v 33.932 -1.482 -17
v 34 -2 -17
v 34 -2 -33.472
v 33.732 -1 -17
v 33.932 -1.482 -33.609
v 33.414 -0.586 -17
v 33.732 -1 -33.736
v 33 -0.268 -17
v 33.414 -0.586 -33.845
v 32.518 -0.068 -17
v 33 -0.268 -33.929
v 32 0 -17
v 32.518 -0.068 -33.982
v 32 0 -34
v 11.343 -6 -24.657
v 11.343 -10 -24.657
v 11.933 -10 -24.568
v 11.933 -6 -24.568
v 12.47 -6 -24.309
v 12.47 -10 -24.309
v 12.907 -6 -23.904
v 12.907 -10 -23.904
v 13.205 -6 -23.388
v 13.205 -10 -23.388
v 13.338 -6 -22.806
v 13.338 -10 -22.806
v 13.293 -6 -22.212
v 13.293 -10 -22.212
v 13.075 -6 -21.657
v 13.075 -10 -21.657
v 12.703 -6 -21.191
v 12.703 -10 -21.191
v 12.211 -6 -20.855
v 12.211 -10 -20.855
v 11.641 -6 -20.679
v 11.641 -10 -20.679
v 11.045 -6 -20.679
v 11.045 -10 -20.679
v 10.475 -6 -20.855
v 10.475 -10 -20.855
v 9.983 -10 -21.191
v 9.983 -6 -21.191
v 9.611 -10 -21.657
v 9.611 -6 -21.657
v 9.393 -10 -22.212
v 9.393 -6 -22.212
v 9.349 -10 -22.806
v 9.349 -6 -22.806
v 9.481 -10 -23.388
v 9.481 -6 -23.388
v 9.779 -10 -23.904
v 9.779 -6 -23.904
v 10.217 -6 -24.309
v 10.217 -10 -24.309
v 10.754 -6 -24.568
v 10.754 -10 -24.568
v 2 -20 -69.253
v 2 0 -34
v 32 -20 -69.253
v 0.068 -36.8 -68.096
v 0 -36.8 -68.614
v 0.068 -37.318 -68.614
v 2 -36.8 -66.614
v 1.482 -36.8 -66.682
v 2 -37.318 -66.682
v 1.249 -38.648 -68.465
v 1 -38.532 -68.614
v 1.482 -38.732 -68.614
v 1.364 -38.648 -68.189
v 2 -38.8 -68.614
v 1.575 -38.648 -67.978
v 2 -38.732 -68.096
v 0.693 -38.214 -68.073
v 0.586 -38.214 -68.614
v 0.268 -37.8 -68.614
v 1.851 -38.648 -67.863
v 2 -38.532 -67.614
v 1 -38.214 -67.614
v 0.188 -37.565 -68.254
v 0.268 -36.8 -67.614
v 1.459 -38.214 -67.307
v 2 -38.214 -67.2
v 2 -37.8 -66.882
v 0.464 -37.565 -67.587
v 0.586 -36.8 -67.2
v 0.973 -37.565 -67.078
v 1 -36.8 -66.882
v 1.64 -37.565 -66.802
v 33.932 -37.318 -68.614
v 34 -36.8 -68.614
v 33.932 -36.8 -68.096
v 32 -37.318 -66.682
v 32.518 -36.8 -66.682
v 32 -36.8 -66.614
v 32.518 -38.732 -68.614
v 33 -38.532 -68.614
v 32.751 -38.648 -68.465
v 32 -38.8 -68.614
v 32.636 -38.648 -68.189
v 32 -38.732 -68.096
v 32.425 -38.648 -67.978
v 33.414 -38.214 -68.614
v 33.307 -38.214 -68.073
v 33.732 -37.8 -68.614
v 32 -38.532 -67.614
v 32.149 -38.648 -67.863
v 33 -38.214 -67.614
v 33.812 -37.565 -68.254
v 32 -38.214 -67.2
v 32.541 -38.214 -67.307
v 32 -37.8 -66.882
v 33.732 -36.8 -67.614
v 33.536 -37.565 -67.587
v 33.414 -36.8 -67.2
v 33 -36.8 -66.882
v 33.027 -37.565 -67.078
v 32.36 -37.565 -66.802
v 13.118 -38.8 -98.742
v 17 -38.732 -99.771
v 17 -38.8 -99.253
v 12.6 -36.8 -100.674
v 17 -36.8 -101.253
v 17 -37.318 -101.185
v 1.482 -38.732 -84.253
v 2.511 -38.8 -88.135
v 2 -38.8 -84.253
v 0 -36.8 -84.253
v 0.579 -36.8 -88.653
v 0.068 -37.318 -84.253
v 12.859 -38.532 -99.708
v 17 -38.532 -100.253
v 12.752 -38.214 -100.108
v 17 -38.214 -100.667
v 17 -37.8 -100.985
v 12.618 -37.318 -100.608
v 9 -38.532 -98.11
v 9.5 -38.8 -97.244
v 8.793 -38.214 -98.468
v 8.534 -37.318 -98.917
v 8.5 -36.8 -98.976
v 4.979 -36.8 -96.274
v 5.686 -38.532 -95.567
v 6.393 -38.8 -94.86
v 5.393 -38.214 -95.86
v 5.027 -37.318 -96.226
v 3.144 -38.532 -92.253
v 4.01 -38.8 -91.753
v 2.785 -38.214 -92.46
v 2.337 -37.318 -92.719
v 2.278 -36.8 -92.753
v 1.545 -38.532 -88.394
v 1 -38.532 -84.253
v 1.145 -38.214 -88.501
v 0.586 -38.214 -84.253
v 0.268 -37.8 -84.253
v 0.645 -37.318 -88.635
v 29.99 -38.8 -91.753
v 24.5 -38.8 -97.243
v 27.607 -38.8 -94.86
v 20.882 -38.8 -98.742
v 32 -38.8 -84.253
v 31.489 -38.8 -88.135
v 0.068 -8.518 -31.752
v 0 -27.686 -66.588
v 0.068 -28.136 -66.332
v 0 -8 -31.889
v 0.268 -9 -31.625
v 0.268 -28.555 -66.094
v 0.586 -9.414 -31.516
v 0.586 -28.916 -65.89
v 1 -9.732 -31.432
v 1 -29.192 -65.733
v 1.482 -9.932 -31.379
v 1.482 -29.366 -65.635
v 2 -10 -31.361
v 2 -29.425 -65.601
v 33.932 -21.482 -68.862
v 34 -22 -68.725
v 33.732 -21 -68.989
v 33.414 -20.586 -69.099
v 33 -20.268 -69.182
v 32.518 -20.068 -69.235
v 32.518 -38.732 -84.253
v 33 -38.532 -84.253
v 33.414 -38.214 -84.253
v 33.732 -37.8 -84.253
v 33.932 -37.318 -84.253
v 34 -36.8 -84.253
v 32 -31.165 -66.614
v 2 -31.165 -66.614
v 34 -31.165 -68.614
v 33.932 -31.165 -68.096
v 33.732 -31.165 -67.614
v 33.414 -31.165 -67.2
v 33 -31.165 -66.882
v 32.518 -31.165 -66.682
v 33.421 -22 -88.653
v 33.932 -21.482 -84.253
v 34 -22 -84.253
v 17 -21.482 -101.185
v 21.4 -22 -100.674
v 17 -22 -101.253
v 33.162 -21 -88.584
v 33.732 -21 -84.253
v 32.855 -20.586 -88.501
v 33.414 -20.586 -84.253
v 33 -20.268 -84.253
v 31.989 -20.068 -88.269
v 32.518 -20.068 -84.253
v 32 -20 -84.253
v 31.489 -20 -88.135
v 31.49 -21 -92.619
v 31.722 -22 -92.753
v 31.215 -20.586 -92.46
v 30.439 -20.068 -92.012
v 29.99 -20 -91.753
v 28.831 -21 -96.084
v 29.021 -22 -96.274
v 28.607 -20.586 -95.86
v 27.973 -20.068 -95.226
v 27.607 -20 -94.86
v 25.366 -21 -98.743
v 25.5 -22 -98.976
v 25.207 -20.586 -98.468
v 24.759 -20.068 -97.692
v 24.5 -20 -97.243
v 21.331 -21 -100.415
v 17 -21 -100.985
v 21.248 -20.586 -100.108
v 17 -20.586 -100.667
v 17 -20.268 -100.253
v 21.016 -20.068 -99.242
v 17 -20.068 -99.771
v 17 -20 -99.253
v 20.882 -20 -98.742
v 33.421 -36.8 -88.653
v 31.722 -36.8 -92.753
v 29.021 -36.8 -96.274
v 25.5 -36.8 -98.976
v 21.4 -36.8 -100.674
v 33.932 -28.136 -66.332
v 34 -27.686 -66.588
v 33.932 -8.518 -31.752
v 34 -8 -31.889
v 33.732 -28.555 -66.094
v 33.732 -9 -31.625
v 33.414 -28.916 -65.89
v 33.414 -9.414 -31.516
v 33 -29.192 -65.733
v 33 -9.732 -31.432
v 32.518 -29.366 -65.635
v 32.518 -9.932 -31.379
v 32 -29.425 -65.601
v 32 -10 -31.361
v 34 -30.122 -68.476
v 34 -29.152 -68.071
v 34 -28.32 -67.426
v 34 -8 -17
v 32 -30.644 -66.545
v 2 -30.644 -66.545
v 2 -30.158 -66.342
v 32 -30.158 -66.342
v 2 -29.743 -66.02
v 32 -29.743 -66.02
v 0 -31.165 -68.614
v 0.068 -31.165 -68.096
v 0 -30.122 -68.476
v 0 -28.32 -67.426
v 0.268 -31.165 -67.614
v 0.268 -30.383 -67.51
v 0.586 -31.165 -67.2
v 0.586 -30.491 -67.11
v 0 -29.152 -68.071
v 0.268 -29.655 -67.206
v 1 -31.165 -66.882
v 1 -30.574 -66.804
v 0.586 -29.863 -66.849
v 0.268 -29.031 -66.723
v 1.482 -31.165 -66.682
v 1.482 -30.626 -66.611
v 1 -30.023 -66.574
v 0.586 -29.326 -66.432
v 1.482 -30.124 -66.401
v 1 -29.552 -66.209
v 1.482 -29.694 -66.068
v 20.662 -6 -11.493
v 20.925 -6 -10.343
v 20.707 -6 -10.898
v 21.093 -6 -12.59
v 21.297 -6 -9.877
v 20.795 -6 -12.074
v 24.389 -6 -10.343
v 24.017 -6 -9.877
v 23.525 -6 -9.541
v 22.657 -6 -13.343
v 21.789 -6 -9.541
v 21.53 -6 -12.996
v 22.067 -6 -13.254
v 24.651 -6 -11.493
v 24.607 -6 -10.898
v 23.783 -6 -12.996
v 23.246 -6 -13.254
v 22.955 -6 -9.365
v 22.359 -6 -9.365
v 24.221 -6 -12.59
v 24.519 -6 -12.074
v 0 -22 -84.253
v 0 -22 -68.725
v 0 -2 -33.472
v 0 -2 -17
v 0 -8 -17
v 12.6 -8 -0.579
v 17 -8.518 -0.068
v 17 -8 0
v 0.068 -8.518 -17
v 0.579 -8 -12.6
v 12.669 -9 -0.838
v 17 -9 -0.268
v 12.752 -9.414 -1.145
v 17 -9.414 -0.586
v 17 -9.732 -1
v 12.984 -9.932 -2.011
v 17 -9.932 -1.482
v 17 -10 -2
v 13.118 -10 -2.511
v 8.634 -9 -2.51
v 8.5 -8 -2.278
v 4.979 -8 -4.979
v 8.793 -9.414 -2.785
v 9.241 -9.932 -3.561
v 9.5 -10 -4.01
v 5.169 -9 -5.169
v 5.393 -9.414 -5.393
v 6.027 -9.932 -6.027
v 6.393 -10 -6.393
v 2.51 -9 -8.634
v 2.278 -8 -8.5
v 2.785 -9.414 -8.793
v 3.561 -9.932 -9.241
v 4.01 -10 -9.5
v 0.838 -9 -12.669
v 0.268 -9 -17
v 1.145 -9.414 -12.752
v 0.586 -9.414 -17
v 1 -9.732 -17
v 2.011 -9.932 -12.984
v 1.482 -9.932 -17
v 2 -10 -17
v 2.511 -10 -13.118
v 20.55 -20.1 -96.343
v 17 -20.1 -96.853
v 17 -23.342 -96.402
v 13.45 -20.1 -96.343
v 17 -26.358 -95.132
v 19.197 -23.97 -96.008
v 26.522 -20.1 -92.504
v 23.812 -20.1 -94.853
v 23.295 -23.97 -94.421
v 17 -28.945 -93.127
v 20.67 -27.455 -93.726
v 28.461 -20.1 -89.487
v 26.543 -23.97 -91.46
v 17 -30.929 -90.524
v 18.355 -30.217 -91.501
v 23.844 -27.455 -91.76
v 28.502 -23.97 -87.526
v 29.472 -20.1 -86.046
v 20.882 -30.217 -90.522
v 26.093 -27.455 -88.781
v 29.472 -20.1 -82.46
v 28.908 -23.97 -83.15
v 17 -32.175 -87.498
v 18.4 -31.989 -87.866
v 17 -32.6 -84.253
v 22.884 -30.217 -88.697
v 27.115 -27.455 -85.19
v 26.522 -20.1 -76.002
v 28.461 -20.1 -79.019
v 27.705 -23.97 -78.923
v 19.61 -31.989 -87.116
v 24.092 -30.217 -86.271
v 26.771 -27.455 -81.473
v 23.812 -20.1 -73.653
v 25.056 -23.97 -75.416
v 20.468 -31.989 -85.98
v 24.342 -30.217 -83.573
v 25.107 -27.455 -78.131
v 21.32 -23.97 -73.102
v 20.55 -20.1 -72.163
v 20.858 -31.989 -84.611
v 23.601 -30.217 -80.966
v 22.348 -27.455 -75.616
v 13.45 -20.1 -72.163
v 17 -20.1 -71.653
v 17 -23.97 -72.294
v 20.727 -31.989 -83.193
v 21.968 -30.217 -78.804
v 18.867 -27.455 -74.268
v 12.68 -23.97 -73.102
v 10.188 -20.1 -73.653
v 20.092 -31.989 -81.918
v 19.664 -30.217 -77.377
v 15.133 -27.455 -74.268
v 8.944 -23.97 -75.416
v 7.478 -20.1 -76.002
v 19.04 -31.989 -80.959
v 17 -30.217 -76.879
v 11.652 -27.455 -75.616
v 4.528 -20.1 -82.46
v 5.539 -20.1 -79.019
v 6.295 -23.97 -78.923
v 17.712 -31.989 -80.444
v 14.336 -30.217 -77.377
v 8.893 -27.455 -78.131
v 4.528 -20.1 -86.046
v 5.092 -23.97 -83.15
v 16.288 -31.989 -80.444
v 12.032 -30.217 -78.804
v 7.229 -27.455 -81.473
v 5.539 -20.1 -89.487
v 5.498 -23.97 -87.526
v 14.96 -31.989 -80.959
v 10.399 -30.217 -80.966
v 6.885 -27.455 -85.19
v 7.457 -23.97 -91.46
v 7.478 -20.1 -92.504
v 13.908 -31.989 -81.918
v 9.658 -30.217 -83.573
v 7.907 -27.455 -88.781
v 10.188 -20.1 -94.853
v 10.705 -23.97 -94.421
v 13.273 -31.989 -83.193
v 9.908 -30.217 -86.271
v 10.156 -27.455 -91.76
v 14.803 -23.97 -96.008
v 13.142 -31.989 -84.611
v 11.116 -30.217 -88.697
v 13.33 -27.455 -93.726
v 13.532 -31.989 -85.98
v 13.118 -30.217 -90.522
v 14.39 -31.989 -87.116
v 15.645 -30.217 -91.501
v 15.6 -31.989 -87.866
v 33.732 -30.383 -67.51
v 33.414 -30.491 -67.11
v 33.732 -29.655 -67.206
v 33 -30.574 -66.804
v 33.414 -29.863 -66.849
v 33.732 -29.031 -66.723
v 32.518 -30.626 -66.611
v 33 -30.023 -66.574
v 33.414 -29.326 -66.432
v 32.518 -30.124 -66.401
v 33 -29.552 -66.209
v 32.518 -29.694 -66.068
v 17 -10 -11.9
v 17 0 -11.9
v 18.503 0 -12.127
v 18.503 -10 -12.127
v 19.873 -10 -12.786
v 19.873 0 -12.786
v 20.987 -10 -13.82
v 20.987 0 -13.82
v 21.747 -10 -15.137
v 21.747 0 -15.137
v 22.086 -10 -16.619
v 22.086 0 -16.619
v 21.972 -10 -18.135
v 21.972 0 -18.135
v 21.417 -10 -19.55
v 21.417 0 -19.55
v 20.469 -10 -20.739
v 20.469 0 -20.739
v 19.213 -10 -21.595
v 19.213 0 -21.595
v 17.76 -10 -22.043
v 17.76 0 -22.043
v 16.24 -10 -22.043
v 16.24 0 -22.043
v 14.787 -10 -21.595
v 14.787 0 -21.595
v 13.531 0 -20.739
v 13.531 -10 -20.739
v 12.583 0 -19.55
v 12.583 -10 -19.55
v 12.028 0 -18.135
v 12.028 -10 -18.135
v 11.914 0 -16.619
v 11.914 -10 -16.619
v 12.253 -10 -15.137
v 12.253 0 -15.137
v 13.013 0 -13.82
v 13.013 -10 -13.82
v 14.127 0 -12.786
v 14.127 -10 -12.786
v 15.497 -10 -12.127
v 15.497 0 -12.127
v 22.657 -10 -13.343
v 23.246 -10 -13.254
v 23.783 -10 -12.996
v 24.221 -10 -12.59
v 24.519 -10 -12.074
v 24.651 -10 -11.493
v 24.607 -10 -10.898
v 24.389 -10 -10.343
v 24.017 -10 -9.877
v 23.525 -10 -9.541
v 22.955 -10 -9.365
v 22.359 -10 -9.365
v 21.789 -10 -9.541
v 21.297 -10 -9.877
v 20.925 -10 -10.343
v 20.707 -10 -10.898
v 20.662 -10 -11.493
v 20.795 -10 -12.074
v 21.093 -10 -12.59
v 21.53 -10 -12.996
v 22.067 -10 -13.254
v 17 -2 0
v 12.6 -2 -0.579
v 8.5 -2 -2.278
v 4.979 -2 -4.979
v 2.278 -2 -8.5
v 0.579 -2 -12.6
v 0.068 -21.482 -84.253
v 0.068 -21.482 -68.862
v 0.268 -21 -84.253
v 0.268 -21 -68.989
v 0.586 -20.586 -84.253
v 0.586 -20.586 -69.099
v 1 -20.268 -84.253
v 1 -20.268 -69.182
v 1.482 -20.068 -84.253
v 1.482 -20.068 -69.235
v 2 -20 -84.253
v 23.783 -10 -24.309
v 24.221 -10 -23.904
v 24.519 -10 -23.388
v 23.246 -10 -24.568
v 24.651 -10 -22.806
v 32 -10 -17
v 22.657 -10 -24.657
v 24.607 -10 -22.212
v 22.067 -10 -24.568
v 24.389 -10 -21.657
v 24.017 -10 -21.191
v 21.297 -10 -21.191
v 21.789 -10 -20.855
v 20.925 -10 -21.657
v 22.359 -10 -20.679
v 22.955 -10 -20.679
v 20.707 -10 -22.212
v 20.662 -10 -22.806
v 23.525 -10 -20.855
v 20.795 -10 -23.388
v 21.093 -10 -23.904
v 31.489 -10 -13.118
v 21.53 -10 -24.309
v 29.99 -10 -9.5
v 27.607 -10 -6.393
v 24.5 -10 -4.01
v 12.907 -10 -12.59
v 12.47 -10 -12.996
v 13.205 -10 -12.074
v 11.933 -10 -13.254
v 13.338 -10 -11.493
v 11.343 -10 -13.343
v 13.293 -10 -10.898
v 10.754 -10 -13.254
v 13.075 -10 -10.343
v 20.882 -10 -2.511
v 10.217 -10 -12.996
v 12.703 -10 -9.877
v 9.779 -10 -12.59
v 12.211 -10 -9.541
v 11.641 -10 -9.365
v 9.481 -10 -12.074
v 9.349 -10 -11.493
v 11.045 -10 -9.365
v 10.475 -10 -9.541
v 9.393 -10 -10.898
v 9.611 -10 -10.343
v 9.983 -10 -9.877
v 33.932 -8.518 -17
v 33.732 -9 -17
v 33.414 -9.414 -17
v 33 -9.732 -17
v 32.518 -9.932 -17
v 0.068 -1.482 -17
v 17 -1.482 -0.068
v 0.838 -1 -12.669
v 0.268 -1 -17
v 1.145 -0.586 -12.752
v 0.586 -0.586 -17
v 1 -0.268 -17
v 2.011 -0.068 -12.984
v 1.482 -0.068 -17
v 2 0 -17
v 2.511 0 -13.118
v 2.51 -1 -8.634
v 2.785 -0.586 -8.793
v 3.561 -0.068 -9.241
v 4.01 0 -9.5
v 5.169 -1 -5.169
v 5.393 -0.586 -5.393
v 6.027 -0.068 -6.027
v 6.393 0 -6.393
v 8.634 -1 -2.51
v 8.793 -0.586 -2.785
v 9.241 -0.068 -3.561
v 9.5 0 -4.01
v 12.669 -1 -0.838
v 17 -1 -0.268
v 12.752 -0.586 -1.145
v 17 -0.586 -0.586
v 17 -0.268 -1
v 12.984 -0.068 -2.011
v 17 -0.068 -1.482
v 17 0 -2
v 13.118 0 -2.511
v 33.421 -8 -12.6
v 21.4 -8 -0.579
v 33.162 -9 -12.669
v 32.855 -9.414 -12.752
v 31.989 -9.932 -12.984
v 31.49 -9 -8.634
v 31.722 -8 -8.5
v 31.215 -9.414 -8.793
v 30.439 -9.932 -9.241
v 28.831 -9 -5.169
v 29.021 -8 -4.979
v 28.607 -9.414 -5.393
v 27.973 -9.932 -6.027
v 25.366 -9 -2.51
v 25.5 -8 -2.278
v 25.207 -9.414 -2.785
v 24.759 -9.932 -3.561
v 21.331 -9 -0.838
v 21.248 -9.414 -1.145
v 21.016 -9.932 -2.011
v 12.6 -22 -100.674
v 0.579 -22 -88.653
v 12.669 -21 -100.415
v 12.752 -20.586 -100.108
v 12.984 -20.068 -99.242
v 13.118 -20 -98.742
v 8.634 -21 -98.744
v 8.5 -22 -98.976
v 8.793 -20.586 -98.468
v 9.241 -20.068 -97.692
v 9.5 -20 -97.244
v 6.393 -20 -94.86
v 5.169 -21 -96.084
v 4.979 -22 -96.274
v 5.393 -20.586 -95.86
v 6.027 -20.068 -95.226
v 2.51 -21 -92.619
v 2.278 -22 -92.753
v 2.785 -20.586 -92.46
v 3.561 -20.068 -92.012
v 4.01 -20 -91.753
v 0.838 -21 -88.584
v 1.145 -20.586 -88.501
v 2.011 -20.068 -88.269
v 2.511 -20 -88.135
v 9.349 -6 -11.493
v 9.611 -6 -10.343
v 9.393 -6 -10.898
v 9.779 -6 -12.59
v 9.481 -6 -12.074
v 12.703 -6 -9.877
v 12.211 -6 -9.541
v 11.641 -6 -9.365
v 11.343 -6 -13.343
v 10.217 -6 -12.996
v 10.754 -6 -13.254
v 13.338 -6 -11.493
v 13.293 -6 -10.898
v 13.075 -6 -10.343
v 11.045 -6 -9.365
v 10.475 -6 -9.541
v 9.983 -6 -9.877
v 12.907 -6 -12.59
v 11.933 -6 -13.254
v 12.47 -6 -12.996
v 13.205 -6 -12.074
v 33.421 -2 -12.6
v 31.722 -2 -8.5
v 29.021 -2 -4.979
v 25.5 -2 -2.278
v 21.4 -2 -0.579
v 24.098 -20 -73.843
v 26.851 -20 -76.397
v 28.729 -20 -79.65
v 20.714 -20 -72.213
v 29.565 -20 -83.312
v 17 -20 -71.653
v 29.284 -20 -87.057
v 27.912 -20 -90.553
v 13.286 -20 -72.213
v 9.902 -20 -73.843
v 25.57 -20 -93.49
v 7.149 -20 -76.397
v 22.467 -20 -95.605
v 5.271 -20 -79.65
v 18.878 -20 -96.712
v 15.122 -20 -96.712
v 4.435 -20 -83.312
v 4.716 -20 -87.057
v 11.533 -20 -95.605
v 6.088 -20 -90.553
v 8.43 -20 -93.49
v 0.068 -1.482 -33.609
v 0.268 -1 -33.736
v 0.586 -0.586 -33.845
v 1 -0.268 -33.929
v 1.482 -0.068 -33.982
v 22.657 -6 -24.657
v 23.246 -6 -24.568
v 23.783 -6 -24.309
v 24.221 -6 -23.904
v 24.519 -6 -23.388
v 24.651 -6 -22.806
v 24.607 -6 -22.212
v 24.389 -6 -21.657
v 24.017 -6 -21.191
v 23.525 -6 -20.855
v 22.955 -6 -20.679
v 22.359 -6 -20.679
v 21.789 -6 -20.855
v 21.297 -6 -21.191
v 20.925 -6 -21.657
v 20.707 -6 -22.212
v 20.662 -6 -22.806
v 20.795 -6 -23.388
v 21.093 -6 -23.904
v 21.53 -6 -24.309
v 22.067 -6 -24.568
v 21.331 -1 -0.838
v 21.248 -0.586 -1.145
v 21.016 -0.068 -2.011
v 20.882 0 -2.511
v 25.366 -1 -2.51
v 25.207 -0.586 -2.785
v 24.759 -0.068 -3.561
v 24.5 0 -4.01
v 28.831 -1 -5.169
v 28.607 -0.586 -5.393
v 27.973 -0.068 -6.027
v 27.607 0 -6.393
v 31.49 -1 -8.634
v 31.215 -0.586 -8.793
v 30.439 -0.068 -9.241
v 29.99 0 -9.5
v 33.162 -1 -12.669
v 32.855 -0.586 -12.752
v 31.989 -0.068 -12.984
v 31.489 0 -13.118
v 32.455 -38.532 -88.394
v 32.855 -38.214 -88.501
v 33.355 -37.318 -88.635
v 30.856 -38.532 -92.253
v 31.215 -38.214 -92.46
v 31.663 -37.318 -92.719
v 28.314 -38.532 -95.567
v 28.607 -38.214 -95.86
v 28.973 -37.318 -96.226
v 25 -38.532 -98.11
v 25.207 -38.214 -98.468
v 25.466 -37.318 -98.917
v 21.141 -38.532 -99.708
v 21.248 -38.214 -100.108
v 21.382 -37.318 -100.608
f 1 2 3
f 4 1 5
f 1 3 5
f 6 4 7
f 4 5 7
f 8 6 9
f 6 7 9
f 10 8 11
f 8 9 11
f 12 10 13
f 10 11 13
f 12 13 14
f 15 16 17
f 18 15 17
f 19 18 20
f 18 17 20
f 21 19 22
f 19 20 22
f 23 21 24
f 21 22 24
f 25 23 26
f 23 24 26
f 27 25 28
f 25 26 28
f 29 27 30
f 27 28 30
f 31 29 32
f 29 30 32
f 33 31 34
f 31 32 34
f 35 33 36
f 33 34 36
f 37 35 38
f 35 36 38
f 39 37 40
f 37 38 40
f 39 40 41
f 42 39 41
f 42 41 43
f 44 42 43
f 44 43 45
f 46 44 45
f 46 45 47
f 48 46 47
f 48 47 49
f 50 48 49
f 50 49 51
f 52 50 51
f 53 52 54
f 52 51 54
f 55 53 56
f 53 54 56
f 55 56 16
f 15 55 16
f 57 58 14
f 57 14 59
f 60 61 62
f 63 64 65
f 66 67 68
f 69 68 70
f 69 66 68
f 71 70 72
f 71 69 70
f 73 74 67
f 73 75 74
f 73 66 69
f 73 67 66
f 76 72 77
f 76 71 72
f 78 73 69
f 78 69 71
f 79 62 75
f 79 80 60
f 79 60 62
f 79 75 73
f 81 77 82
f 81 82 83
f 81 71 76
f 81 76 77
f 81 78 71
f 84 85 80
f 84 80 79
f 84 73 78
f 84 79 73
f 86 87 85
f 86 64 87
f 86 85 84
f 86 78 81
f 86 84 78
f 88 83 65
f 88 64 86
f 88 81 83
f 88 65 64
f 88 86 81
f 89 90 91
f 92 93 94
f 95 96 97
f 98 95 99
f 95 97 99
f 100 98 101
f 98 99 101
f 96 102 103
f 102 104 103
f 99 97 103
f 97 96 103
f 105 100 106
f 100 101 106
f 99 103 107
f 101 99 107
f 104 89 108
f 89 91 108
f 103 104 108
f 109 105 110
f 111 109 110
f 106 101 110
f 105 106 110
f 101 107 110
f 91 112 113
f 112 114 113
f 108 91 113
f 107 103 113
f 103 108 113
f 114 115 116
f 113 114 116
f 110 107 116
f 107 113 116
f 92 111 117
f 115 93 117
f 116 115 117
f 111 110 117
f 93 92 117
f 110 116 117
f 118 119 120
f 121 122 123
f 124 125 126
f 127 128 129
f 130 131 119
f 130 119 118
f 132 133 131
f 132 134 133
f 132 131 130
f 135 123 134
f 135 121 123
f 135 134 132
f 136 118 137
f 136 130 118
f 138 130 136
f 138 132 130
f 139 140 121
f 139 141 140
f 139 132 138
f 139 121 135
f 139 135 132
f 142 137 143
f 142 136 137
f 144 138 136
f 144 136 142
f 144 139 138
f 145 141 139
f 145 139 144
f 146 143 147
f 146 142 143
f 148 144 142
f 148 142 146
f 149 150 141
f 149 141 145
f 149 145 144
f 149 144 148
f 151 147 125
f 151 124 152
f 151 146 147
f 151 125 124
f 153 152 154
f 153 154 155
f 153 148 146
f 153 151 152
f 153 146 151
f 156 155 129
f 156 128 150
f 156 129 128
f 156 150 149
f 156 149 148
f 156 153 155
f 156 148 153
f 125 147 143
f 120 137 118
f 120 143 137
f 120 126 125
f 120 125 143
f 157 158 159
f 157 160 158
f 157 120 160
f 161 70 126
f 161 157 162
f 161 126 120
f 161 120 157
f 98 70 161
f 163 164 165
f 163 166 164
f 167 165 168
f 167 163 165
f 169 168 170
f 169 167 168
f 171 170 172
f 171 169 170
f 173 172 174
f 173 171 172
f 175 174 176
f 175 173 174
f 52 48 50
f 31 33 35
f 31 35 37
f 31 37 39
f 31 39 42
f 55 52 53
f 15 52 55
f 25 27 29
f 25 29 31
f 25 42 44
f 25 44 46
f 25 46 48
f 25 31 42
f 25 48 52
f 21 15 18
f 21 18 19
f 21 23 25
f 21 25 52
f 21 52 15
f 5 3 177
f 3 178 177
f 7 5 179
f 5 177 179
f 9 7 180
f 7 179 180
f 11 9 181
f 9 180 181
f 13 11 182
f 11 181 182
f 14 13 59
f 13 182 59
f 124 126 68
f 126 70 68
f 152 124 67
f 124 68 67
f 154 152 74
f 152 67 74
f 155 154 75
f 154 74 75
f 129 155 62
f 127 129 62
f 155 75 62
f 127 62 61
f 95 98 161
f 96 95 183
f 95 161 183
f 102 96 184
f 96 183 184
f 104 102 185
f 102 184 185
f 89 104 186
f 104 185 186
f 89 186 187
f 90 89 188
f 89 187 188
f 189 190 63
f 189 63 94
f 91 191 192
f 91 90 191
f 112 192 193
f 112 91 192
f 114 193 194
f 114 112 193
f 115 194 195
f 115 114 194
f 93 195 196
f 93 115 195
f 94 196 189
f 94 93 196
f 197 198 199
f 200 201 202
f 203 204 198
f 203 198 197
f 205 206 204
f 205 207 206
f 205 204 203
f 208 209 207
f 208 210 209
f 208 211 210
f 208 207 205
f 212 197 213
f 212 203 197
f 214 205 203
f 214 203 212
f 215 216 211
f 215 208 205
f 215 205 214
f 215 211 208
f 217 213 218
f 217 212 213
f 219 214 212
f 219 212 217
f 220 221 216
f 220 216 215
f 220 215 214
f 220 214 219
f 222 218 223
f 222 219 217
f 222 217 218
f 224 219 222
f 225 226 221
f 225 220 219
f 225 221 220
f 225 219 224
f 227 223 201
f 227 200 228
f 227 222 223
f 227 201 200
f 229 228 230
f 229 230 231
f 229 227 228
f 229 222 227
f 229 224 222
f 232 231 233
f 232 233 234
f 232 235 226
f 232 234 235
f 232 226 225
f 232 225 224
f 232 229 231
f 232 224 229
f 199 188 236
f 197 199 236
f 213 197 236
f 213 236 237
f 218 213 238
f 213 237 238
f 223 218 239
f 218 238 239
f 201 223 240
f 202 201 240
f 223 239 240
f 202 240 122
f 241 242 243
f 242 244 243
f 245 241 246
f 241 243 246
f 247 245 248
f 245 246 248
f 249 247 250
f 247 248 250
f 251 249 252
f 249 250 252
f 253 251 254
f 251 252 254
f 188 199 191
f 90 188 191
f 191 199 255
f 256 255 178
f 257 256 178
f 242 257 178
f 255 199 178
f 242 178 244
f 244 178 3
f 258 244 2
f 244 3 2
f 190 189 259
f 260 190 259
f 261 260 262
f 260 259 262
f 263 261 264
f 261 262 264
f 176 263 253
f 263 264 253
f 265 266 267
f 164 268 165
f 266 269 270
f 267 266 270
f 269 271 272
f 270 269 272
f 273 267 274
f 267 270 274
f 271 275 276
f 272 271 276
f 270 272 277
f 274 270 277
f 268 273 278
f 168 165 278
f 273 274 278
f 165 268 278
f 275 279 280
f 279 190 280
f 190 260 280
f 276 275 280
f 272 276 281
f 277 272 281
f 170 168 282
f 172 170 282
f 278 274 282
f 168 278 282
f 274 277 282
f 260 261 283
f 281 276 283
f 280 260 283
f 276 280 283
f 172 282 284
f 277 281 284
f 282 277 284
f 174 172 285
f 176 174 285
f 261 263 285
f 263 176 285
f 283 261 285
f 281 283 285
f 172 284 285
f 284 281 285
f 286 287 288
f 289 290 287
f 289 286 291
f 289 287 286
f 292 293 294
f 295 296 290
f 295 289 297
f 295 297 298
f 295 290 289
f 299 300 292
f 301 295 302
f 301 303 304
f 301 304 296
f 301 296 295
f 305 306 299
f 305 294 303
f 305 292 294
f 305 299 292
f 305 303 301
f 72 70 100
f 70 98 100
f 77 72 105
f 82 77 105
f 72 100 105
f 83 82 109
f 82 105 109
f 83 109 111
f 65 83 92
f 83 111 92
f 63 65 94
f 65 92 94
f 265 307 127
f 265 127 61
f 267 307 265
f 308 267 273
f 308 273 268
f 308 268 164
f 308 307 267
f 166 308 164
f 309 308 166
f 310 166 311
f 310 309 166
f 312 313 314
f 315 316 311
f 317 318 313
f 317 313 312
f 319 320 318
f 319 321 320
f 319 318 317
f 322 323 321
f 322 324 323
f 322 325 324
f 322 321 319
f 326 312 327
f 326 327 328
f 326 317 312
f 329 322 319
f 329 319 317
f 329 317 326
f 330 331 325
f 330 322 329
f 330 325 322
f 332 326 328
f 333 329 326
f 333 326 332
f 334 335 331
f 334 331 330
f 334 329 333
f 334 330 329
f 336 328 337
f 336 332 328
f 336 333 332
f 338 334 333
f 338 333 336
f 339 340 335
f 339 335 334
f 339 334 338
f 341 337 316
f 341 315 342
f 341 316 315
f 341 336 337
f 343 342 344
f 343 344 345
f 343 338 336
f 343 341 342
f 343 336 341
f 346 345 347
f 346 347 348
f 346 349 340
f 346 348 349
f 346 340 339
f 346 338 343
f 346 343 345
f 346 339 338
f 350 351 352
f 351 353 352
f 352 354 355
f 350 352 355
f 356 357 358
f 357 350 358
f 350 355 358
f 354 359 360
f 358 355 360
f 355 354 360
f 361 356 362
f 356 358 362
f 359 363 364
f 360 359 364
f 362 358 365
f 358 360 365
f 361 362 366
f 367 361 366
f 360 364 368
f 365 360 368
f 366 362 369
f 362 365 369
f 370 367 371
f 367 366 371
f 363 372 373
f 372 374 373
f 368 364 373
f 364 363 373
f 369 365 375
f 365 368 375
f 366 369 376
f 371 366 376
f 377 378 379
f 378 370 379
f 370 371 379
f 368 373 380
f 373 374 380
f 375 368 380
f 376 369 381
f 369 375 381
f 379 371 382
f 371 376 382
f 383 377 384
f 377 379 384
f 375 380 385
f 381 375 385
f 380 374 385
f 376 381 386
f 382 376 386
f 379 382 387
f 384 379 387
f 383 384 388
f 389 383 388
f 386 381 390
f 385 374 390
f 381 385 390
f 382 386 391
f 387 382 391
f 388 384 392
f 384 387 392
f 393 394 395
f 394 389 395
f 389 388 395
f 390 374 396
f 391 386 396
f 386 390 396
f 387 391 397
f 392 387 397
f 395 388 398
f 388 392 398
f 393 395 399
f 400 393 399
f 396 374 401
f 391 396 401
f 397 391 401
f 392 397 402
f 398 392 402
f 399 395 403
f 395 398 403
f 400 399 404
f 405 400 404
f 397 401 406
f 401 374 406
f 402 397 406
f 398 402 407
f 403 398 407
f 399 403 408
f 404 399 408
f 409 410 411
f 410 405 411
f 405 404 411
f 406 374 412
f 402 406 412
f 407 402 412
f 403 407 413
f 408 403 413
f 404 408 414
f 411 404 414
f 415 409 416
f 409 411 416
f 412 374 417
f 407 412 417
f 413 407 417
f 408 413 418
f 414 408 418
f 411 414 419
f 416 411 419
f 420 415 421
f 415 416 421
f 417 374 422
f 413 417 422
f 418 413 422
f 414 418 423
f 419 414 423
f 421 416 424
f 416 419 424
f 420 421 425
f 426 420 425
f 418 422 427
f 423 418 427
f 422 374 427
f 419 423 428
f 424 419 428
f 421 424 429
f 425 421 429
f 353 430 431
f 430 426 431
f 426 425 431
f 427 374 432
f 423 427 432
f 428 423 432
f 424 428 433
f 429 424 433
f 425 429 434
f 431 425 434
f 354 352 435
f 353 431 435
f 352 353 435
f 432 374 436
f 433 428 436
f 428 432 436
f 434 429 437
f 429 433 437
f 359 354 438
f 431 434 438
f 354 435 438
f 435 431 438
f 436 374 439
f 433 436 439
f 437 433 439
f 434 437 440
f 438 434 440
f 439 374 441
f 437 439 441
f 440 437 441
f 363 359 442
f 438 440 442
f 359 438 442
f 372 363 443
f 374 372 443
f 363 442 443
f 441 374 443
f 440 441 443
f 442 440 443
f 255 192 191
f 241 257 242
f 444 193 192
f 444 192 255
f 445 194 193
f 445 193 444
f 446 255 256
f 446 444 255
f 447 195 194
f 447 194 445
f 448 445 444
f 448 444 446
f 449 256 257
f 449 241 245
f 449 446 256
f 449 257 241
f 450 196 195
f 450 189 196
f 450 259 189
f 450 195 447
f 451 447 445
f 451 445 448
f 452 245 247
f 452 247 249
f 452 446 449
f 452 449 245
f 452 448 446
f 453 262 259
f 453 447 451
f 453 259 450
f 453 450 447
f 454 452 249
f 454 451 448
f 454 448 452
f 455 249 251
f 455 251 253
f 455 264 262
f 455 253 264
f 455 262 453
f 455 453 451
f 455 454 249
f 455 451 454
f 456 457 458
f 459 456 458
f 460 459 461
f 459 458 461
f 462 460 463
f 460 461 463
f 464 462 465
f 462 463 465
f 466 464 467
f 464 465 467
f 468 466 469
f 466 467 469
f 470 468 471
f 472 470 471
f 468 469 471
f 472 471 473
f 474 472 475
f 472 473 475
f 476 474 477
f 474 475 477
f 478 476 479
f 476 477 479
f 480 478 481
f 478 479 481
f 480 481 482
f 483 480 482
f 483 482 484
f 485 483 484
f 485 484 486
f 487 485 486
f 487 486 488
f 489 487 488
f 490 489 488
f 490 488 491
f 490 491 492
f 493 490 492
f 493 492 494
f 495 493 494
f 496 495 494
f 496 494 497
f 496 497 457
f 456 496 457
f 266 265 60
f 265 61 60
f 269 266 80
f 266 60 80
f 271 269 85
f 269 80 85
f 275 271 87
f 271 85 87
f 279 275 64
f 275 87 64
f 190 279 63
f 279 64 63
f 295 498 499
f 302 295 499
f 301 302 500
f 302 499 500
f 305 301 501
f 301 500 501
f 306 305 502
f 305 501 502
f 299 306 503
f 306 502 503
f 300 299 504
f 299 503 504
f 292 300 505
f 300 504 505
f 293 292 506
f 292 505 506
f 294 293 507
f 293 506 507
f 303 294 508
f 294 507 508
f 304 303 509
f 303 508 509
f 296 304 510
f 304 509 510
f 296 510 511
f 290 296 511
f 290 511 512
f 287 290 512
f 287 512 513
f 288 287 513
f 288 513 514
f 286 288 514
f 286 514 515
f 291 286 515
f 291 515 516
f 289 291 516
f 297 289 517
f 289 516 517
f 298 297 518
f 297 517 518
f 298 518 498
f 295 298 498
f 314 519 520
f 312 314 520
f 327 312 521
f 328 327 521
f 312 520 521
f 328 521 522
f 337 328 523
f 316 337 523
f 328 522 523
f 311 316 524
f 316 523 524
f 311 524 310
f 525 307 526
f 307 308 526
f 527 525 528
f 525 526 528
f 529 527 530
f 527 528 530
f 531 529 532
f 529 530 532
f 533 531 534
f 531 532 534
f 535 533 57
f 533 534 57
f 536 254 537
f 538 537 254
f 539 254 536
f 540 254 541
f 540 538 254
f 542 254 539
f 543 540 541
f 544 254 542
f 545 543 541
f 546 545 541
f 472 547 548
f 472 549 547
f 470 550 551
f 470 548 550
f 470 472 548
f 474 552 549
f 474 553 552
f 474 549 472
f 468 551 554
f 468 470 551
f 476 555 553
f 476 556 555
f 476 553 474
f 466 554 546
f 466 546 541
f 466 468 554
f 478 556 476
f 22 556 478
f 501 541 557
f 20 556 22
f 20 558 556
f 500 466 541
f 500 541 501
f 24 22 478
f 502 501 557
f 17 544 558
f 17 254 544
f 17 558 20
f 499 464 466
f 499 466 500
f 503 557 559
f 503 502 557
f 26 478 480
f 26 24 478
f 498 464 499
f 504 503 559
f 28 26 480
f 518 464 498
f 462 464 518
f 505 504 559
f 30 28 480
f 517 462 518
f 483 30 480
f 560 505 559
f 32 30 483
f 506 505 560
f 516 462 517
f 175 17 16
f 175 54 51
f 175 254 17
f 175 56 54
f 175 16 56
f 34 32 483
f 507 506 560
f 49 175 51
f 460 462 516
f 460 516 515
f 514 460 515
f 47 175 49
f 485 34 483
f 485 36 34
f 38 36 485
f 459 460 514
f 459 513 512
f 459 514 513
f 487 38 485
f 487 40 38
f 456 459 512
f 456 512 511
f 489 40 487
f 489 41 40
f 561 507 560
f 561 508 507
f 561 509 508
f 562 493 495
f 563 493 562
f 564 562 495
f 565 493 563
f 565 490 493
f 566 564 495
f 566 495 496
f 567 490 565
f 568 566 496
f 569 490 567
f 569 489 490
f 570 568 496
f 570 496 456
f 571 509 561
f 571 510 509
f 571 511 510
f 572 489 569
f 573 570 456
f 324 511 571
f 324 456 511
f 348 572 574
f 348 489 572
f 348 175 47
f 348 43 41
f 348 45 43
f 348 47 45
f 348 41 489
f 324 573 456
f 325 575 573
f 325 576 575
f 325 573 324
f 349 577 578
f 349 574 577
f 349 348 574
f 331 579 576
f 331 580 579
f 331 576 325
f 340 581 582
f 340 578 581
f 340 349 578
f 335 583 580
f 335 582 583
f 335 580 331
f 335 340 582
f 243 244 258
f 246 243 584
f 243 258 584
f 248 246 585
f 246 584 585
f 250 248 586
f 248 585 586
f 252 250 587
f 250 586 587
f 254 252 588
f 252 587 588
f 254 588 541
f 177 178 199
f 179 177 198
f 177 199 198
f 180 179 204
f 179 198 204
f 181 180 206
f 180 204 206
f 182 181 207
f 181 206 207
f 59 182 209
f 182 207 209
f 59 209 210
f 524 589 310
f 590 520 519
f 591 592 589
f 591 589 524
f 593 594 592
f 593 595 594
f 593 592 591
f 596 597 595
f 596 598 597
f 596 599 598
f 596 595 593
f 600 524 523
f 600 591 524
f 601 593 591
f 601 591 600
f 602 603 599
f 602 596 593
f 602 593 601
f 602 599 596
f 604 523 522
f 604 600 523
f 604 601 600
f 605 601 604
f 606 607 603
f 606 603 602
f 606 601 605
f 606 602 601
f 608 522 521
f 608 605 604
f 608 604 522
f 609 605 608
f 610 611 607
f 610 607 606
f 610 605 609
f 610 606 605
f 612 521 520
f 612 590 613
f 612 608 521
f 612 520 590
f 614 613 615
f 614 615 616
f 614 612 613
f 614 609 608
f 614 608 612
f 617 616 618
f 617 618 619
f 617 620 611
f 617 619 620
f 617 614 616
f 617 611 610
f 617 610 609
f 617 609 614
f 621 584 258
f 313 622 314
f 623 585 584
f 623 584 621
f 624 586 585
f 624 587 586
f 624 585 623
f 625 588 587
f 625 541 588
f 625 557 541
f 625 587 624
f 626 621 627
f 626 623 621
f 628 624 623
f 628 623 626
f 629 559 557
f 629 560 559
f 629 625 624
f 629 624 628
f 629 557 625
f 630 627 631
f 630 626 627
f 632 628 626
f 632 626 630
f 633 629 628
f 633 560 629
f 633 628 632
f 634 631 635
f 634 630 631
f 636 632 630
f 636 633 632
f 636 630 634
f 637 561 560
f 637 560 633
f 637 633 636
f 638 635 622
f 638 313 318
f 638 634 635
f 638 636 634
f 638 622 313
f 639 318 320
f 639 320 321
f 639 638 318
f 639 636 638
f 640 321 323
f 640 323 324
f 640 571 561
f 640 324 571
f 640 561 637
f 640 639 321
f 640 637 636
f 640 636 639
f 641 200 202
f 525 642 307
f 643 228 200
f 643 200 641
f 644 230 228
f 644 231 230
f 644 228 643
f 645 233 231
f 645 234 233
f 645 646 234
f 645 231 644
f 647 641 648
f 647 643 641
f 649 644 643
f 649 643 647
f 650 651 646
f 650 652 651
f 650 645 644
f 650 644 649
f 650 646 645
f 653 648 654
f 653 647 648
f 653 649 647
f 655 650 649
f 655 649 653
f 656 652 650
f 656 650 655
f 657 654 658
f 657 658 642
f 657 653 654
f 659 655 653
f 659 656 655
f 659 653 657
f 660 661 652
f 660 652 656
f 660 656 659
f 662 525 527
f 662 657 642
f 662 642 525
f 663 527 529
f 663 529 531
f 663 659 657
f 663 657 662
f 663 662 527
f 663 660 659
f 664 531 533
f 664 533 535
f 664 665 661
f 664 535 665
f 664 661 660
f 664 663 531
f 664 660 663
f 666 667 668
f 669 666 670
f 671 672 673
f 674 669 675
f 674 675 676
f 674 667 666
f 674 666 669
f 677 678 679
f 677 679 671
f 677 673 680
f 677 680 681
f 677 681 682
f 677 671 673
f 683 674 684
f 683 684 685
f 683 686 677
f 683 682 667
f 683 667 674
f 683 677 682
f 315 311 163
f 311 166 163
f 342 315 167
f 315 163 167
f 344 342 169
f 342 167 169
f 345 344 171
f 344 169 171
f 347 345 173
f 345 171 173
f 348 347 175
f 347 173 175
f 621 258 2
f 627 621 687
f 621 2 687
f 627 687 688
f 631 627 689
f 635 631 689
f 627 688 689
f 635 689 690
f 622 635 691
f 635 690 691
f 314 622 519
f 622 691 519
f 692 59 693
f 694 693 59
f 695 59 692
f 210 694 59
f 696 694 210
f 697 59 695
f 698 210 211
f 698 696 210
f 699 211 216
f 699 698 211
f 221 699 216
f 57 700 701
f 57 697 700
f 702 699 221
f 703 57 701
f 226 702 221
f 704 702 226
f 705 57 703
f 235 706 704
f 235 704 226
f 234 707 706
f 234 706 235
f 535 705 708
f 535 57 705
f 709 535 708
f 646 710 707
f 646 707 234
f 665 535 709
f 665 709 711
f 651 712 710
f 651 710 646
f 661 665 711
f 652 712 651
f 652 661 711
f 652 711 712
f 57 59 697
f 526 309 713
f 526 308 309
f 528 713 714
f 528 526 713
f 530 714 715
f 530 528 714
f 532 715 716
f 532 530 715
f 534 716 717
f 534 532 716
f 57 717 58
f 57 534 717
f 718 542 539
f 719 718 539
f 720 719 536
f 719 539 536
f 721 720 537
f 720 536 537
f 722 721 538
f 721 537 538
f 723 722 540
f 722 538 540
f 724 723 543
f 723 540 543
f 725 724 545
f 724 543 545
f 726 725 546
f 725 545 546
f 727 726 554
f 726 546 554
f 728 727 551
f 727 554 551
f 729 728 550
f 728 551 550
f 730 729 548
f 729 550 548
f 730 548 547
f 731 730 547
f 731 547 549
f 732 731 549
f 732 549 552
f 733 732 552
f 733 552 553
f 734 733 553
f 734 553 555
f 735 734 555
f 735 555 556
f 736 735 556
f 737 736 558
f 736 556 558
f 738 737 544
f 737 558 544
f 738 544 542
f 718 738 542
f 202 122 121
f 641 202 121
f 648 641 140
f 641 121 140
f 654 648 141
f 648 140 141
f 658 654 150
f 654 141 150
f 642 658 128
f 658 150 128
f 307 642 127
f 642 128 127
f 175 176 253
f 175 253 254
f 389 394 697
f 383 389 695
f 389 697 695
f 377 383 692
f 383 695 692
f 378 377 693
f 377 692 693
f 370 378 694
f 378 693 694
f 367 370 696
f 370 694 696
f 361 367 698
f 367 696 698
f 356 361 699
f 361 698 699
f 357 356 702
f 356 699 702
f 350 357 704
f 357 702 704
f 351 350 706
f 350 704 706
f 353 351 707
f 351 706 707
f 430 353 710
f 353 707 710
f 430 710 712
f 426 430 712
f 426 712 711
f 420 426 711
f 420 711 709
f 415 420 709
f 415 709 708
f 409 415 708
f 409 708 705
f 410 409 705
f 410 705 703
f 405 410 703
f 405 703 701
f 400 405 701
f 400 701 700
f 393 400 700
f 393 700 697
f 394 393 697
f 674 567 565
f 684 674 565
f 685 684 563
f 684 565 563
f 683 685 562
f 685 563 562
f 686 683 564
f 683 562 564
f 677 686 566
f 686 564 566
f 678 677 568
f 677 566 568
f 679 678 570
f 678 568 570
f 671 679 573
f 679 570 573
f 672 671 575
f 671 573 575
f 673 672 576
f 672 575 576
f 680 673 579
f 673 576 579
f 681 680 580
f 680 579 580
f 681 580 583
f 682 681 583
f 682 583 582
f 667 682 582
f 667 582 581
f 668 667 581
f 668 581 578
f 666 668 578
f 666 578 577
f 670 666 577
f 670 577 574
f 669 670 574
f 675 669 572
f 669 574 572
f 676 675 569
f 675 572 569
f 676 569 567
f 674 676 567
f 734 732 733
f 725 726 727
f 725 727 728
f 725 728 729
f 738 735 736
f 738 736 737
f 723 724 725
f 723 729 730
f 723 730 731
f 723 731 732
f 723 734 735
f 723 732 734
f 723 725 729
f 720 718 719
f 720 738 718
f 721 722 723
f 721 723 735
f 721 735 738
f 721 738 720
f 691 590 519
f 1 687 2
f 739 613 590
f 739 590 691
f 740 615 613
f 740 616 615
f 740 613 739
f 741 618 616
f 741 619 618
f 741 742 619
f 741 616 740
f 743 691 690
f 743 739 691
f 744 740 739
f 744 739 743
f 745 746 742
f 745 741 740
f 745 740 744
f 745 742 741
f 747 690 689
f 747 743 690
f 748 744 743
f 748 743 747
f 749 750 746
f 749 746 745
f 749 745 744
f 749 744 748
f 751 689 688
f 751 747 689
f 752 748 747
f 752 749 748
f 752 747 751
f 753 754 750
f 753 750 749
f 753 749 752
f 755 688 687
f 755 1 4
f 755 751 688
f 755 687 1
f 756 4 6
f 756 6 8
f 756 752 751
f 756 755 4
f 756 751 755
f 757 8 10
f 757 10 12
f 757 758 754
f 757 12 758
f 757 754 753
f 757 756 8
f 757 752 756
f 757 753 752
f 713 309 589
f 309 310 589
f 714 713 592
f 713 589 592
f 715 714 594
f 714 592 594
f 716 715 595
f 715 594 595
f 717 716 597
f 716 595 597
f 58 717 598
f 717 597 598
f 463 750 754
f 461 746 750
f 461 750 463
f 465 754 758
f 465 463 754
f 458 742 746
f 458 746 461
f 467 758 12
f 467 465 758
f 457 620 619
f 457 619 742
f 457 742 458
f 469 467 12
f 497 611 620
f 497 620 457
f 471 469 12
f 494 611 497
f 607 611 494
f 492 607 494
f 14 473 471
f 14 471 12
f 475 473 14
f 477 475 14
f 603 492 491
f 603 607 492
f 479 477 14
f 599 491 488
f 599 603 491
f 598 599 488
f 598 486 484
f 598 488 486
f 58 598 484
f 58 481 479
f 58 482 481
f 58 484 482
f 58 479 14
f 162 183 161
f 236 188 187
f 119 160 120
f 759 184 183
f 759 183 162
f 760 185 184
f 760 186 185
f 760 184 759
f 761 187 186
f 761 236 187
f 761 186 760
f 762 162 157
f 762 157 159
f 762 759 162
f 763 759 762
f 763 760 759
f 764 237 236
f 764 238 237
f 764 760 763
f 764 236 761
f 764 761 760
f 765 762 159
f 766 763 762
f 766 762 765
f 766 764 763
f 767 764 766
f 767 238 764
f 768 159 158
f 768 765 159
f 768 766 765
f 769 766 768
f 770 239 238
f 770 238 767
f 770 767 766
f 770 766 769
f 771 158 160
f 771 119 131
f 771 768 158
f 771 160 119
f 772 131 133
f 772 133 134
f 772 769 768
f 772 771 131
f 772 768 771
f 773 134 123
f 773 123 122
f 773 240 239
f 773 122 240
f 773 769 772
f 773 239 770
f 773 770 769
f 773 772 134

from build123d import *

# Parameters (mm, degrees)
PROFILEEXTRUDE_THIN1_DEPTH          = 34
DOMEPADEXTENSIONSKETCH1_W           = 34
DOMEPADEXTENSIONSKETCH1_H           = 34.639067238
DOMEPADEXTENSIONBOSS_EXTRUDE1_DEPTH = 8.8
FILLET1_R                           = 17
FILLET2_R                           = 17
FLANGENUTHOLESKETCH4_R              = 5.1
FLANGENUTHOLECUT_EXTRUDE5_DEPTH     = 114.638162666
DOMEINDENTSKETCH6_R                 = 12.6
DOMEINDENTCUT_EXTRUDE8_DEPTH        = 0.1
DOME2_FACE_RADIUS                   = 12.6
DOME2_HEIGHT                        = 12.5
FILLET3_R                           = 17
FILLET4_R                           = 17
BOTTOMBOUNDARYFILLET5_R             = 2
FLANGENUTHOLESSKETCH2_R             = 2
FLANGENUTHOLESCUT_EXTRUDE1_DEPTH    = 4
FILLET6_R                           = 2


with BuildPart() as part:
    # ProfileSketch1 → ProfileExtrude-Thin1 (new body)
    with BuildSketch(Plane(origin=(0, 0, 0), x_dir=(0, 0, -1), z_dir=(1, 0, 0))):
        Polygon((0, 0), (34, 0), (69.253108664, -20), (101.253108664, -20), (101.253108664, -30), (66.614041426, -30), (31.360932762, -10), (0, -10), align=None)
    extrude(amount=PROFILEEXTRUDE_THIN1_DEPTH)

    # DomePadExtensionSketch1 → DomePadExtensionBoss-Extrude1 (add)
    with BuildSketch(Plane.XZ.offset(30)):
        with Locations((17, -83.933575045)):
            Rectangle(DOMEPADEXTENSIONSKETCH1_W, DOMEPADEXTENSIONSKETCH1_H)
    extrude(amount=DOMEPADEXTENSIONBOSS_EXTRUDE1_DEPTH)

    # Fillet1
    fillet1_edges = [part.edges().sort_by_distance(p)[0] for p in [
        (34, -5, 0),
    ]]
    fillet(fillet1_edges, radius=FILLET1_R)

    # Fillet2
    fillet2_edges = [part.edges().sort_by_distance(p)[0] for p in [
        (0, -5, 0),
    ]]
    fillet(fillet2_edges, radius=FILLET2_R - 0.0001)  # a hair under: the kernel refuses the full size

    # FlangeNutHoleSketch4 → FlangeNutHoleCut-Extrude5 (cut, through all)
    with BuildSketch(Plane(origin=(0, 0, 0), x_dir=(1, 0, 0), z_dir=(0, 1, 0))):
        with Locations(Location((17, 17, 0), (0, 0, 270))):
            Circle(FLANGENUTHOLESKETCH4_R)
    extrude(amount=-FLANGENUTHOLECUT_EXTRUDE5_DEPTH, mode=Mode.SUBTRACT)

    # DomeIndentSketch6 → DomeIndentCut-Extrude8 (cut)
    with BuildSketch(Plane(origin=(0, -20, 0), x_dir=(1, 0, 0), z_dir=(0, 1, 0))):
        with Locations(Location((17, 84.253108664, 0), (0, 0, 270))):
            Circle(DOMEINDENTSKETCH6_R)
    extrude(amount=-DOMEINDENTCUT_EXTRUDE8_DEPTH, mode=Mode.SUBTRACT)

    # Dome2: a dome of height H over a round flat face of radius A is a cap of a sphere of radius (A * A + H * H) / (2 * H)
    dome2_r = (DOME2_FACE_RADIUS * DOME2_FACE_RADIUS + DOME2_HEIGHT * DOME2_HEIGHT) / (2 * DOME2_HEIGHT)
    dome2_base = Plane((17, -20.1, -84.253108664), z_dir=(0, -1, 0))
    with Locations(dome2_base.offset(DOME2_HEIGHT - dome2_r)):
        dome2_ball = Sphere(dome2_r, mode=Mode.PRIVATE)
    add(split(dome2_ball, bisect_by=dome2_base, keep=Keep.TOP, mode=Mode.PRIVATE), mode=Mode.SUBTRACT)

    # Fillet3
    fillet3_edges = [part.edges().sort_by_distance(p)[0] for p in [
        (34, -29.4, -101.253108664),
    ]]
    fillet(fillet3_edges, radius=FILLET3_R)

    # Fillet4
    fillet4_edges = [part.edges().sort_by_distance(p)[0] for p in [
        (0, -29.4, -101.253108664),
    ]]
    fillet(fillet4_edges, radius=FILLET4_R - 0.0001)  # a hair under: the kernel refuses the full size

    # BottomBoundaryFillet5
    bottomboundaryfillet5_edges = [part.edges().sort_by_distance(p)[0] for p in [
        (17, -30, -66.614041426),
        (0, -34.4, -66.614041426),
        (34, -34.4, -66.614041426),
        (0, -38.8, -75.433625045),
        (17, -38.8, -66.614041426),
        (34, -20, -48.987487094),
        (34, -10, -24.180466381),
        (29.02081528, -10, -4.97918472),
        (0, -10, -24.180416381),
        (4.979155431, -10, -4.979155431),
        (34, -38.8, -75.433575045),
        (29.02081528, -38.8, -96.273923944),
        (4.979155431, -38.8, -96.273953234),
        (0, -20, -48.987487094),
    ]]
    fillet(bottomboundaryfillet5_edges, radius=BOTTOMBOUNDARYFILLET5_R)

    # FlangeNutHolesSketch2 → FlangeNutHolesCut-Extrude1 (cut)
    with BuildSketch(Plane.XZ.offset(10)):
        with Locations(Location((11.343145751, -11.343145751, 0), (0, 0, 270))):
            Circle(FLANGENUTHOLESSKETCH2_R)
        with Locations(Location((22.656854249, -11.343145751, 0), (0, 0, 270))):
            Circle(FLANGENUTHOLESSKETCH2_R)
        with Locations(Location((22.656854249, -22.656854249, 0), (0, 0, 270))):
            Circle(FLANGENUTHOLESSKETCH2_R)
        with Locations(Location((11.343145751, -22.656854249, 0), (0, 0, 270))):
            Circle(FLANGENUTHOLESSKETCH2_R)
    extrude(amount=-FLANGENUTHOLESCUT_EXTRUDE1_DEPTH, mode=Mode.SUBTRACT)

    # Fillet6
    fillet6_edges = [part.edges().sort_by_distance(p)[0] for p in [
        (34, -20, -76.753108664),
        (34, -10, -51.626554332),
        (34, 0, -25.5),
        (29.02081528, 0, -4.97918472),
        (0, 0, -25.49995),
        (4.979155431, 0, -4.979155431),
        (29.02081528, -20, -96.273923944),
        (4.979155431, -20, -96.273953234),
        (0, -10, -51.626554332),
        (0, -20, -76.753158664),
    ]]
    fillet(fillet6_edges, radius=FILLET6_R)


solid = part.part
